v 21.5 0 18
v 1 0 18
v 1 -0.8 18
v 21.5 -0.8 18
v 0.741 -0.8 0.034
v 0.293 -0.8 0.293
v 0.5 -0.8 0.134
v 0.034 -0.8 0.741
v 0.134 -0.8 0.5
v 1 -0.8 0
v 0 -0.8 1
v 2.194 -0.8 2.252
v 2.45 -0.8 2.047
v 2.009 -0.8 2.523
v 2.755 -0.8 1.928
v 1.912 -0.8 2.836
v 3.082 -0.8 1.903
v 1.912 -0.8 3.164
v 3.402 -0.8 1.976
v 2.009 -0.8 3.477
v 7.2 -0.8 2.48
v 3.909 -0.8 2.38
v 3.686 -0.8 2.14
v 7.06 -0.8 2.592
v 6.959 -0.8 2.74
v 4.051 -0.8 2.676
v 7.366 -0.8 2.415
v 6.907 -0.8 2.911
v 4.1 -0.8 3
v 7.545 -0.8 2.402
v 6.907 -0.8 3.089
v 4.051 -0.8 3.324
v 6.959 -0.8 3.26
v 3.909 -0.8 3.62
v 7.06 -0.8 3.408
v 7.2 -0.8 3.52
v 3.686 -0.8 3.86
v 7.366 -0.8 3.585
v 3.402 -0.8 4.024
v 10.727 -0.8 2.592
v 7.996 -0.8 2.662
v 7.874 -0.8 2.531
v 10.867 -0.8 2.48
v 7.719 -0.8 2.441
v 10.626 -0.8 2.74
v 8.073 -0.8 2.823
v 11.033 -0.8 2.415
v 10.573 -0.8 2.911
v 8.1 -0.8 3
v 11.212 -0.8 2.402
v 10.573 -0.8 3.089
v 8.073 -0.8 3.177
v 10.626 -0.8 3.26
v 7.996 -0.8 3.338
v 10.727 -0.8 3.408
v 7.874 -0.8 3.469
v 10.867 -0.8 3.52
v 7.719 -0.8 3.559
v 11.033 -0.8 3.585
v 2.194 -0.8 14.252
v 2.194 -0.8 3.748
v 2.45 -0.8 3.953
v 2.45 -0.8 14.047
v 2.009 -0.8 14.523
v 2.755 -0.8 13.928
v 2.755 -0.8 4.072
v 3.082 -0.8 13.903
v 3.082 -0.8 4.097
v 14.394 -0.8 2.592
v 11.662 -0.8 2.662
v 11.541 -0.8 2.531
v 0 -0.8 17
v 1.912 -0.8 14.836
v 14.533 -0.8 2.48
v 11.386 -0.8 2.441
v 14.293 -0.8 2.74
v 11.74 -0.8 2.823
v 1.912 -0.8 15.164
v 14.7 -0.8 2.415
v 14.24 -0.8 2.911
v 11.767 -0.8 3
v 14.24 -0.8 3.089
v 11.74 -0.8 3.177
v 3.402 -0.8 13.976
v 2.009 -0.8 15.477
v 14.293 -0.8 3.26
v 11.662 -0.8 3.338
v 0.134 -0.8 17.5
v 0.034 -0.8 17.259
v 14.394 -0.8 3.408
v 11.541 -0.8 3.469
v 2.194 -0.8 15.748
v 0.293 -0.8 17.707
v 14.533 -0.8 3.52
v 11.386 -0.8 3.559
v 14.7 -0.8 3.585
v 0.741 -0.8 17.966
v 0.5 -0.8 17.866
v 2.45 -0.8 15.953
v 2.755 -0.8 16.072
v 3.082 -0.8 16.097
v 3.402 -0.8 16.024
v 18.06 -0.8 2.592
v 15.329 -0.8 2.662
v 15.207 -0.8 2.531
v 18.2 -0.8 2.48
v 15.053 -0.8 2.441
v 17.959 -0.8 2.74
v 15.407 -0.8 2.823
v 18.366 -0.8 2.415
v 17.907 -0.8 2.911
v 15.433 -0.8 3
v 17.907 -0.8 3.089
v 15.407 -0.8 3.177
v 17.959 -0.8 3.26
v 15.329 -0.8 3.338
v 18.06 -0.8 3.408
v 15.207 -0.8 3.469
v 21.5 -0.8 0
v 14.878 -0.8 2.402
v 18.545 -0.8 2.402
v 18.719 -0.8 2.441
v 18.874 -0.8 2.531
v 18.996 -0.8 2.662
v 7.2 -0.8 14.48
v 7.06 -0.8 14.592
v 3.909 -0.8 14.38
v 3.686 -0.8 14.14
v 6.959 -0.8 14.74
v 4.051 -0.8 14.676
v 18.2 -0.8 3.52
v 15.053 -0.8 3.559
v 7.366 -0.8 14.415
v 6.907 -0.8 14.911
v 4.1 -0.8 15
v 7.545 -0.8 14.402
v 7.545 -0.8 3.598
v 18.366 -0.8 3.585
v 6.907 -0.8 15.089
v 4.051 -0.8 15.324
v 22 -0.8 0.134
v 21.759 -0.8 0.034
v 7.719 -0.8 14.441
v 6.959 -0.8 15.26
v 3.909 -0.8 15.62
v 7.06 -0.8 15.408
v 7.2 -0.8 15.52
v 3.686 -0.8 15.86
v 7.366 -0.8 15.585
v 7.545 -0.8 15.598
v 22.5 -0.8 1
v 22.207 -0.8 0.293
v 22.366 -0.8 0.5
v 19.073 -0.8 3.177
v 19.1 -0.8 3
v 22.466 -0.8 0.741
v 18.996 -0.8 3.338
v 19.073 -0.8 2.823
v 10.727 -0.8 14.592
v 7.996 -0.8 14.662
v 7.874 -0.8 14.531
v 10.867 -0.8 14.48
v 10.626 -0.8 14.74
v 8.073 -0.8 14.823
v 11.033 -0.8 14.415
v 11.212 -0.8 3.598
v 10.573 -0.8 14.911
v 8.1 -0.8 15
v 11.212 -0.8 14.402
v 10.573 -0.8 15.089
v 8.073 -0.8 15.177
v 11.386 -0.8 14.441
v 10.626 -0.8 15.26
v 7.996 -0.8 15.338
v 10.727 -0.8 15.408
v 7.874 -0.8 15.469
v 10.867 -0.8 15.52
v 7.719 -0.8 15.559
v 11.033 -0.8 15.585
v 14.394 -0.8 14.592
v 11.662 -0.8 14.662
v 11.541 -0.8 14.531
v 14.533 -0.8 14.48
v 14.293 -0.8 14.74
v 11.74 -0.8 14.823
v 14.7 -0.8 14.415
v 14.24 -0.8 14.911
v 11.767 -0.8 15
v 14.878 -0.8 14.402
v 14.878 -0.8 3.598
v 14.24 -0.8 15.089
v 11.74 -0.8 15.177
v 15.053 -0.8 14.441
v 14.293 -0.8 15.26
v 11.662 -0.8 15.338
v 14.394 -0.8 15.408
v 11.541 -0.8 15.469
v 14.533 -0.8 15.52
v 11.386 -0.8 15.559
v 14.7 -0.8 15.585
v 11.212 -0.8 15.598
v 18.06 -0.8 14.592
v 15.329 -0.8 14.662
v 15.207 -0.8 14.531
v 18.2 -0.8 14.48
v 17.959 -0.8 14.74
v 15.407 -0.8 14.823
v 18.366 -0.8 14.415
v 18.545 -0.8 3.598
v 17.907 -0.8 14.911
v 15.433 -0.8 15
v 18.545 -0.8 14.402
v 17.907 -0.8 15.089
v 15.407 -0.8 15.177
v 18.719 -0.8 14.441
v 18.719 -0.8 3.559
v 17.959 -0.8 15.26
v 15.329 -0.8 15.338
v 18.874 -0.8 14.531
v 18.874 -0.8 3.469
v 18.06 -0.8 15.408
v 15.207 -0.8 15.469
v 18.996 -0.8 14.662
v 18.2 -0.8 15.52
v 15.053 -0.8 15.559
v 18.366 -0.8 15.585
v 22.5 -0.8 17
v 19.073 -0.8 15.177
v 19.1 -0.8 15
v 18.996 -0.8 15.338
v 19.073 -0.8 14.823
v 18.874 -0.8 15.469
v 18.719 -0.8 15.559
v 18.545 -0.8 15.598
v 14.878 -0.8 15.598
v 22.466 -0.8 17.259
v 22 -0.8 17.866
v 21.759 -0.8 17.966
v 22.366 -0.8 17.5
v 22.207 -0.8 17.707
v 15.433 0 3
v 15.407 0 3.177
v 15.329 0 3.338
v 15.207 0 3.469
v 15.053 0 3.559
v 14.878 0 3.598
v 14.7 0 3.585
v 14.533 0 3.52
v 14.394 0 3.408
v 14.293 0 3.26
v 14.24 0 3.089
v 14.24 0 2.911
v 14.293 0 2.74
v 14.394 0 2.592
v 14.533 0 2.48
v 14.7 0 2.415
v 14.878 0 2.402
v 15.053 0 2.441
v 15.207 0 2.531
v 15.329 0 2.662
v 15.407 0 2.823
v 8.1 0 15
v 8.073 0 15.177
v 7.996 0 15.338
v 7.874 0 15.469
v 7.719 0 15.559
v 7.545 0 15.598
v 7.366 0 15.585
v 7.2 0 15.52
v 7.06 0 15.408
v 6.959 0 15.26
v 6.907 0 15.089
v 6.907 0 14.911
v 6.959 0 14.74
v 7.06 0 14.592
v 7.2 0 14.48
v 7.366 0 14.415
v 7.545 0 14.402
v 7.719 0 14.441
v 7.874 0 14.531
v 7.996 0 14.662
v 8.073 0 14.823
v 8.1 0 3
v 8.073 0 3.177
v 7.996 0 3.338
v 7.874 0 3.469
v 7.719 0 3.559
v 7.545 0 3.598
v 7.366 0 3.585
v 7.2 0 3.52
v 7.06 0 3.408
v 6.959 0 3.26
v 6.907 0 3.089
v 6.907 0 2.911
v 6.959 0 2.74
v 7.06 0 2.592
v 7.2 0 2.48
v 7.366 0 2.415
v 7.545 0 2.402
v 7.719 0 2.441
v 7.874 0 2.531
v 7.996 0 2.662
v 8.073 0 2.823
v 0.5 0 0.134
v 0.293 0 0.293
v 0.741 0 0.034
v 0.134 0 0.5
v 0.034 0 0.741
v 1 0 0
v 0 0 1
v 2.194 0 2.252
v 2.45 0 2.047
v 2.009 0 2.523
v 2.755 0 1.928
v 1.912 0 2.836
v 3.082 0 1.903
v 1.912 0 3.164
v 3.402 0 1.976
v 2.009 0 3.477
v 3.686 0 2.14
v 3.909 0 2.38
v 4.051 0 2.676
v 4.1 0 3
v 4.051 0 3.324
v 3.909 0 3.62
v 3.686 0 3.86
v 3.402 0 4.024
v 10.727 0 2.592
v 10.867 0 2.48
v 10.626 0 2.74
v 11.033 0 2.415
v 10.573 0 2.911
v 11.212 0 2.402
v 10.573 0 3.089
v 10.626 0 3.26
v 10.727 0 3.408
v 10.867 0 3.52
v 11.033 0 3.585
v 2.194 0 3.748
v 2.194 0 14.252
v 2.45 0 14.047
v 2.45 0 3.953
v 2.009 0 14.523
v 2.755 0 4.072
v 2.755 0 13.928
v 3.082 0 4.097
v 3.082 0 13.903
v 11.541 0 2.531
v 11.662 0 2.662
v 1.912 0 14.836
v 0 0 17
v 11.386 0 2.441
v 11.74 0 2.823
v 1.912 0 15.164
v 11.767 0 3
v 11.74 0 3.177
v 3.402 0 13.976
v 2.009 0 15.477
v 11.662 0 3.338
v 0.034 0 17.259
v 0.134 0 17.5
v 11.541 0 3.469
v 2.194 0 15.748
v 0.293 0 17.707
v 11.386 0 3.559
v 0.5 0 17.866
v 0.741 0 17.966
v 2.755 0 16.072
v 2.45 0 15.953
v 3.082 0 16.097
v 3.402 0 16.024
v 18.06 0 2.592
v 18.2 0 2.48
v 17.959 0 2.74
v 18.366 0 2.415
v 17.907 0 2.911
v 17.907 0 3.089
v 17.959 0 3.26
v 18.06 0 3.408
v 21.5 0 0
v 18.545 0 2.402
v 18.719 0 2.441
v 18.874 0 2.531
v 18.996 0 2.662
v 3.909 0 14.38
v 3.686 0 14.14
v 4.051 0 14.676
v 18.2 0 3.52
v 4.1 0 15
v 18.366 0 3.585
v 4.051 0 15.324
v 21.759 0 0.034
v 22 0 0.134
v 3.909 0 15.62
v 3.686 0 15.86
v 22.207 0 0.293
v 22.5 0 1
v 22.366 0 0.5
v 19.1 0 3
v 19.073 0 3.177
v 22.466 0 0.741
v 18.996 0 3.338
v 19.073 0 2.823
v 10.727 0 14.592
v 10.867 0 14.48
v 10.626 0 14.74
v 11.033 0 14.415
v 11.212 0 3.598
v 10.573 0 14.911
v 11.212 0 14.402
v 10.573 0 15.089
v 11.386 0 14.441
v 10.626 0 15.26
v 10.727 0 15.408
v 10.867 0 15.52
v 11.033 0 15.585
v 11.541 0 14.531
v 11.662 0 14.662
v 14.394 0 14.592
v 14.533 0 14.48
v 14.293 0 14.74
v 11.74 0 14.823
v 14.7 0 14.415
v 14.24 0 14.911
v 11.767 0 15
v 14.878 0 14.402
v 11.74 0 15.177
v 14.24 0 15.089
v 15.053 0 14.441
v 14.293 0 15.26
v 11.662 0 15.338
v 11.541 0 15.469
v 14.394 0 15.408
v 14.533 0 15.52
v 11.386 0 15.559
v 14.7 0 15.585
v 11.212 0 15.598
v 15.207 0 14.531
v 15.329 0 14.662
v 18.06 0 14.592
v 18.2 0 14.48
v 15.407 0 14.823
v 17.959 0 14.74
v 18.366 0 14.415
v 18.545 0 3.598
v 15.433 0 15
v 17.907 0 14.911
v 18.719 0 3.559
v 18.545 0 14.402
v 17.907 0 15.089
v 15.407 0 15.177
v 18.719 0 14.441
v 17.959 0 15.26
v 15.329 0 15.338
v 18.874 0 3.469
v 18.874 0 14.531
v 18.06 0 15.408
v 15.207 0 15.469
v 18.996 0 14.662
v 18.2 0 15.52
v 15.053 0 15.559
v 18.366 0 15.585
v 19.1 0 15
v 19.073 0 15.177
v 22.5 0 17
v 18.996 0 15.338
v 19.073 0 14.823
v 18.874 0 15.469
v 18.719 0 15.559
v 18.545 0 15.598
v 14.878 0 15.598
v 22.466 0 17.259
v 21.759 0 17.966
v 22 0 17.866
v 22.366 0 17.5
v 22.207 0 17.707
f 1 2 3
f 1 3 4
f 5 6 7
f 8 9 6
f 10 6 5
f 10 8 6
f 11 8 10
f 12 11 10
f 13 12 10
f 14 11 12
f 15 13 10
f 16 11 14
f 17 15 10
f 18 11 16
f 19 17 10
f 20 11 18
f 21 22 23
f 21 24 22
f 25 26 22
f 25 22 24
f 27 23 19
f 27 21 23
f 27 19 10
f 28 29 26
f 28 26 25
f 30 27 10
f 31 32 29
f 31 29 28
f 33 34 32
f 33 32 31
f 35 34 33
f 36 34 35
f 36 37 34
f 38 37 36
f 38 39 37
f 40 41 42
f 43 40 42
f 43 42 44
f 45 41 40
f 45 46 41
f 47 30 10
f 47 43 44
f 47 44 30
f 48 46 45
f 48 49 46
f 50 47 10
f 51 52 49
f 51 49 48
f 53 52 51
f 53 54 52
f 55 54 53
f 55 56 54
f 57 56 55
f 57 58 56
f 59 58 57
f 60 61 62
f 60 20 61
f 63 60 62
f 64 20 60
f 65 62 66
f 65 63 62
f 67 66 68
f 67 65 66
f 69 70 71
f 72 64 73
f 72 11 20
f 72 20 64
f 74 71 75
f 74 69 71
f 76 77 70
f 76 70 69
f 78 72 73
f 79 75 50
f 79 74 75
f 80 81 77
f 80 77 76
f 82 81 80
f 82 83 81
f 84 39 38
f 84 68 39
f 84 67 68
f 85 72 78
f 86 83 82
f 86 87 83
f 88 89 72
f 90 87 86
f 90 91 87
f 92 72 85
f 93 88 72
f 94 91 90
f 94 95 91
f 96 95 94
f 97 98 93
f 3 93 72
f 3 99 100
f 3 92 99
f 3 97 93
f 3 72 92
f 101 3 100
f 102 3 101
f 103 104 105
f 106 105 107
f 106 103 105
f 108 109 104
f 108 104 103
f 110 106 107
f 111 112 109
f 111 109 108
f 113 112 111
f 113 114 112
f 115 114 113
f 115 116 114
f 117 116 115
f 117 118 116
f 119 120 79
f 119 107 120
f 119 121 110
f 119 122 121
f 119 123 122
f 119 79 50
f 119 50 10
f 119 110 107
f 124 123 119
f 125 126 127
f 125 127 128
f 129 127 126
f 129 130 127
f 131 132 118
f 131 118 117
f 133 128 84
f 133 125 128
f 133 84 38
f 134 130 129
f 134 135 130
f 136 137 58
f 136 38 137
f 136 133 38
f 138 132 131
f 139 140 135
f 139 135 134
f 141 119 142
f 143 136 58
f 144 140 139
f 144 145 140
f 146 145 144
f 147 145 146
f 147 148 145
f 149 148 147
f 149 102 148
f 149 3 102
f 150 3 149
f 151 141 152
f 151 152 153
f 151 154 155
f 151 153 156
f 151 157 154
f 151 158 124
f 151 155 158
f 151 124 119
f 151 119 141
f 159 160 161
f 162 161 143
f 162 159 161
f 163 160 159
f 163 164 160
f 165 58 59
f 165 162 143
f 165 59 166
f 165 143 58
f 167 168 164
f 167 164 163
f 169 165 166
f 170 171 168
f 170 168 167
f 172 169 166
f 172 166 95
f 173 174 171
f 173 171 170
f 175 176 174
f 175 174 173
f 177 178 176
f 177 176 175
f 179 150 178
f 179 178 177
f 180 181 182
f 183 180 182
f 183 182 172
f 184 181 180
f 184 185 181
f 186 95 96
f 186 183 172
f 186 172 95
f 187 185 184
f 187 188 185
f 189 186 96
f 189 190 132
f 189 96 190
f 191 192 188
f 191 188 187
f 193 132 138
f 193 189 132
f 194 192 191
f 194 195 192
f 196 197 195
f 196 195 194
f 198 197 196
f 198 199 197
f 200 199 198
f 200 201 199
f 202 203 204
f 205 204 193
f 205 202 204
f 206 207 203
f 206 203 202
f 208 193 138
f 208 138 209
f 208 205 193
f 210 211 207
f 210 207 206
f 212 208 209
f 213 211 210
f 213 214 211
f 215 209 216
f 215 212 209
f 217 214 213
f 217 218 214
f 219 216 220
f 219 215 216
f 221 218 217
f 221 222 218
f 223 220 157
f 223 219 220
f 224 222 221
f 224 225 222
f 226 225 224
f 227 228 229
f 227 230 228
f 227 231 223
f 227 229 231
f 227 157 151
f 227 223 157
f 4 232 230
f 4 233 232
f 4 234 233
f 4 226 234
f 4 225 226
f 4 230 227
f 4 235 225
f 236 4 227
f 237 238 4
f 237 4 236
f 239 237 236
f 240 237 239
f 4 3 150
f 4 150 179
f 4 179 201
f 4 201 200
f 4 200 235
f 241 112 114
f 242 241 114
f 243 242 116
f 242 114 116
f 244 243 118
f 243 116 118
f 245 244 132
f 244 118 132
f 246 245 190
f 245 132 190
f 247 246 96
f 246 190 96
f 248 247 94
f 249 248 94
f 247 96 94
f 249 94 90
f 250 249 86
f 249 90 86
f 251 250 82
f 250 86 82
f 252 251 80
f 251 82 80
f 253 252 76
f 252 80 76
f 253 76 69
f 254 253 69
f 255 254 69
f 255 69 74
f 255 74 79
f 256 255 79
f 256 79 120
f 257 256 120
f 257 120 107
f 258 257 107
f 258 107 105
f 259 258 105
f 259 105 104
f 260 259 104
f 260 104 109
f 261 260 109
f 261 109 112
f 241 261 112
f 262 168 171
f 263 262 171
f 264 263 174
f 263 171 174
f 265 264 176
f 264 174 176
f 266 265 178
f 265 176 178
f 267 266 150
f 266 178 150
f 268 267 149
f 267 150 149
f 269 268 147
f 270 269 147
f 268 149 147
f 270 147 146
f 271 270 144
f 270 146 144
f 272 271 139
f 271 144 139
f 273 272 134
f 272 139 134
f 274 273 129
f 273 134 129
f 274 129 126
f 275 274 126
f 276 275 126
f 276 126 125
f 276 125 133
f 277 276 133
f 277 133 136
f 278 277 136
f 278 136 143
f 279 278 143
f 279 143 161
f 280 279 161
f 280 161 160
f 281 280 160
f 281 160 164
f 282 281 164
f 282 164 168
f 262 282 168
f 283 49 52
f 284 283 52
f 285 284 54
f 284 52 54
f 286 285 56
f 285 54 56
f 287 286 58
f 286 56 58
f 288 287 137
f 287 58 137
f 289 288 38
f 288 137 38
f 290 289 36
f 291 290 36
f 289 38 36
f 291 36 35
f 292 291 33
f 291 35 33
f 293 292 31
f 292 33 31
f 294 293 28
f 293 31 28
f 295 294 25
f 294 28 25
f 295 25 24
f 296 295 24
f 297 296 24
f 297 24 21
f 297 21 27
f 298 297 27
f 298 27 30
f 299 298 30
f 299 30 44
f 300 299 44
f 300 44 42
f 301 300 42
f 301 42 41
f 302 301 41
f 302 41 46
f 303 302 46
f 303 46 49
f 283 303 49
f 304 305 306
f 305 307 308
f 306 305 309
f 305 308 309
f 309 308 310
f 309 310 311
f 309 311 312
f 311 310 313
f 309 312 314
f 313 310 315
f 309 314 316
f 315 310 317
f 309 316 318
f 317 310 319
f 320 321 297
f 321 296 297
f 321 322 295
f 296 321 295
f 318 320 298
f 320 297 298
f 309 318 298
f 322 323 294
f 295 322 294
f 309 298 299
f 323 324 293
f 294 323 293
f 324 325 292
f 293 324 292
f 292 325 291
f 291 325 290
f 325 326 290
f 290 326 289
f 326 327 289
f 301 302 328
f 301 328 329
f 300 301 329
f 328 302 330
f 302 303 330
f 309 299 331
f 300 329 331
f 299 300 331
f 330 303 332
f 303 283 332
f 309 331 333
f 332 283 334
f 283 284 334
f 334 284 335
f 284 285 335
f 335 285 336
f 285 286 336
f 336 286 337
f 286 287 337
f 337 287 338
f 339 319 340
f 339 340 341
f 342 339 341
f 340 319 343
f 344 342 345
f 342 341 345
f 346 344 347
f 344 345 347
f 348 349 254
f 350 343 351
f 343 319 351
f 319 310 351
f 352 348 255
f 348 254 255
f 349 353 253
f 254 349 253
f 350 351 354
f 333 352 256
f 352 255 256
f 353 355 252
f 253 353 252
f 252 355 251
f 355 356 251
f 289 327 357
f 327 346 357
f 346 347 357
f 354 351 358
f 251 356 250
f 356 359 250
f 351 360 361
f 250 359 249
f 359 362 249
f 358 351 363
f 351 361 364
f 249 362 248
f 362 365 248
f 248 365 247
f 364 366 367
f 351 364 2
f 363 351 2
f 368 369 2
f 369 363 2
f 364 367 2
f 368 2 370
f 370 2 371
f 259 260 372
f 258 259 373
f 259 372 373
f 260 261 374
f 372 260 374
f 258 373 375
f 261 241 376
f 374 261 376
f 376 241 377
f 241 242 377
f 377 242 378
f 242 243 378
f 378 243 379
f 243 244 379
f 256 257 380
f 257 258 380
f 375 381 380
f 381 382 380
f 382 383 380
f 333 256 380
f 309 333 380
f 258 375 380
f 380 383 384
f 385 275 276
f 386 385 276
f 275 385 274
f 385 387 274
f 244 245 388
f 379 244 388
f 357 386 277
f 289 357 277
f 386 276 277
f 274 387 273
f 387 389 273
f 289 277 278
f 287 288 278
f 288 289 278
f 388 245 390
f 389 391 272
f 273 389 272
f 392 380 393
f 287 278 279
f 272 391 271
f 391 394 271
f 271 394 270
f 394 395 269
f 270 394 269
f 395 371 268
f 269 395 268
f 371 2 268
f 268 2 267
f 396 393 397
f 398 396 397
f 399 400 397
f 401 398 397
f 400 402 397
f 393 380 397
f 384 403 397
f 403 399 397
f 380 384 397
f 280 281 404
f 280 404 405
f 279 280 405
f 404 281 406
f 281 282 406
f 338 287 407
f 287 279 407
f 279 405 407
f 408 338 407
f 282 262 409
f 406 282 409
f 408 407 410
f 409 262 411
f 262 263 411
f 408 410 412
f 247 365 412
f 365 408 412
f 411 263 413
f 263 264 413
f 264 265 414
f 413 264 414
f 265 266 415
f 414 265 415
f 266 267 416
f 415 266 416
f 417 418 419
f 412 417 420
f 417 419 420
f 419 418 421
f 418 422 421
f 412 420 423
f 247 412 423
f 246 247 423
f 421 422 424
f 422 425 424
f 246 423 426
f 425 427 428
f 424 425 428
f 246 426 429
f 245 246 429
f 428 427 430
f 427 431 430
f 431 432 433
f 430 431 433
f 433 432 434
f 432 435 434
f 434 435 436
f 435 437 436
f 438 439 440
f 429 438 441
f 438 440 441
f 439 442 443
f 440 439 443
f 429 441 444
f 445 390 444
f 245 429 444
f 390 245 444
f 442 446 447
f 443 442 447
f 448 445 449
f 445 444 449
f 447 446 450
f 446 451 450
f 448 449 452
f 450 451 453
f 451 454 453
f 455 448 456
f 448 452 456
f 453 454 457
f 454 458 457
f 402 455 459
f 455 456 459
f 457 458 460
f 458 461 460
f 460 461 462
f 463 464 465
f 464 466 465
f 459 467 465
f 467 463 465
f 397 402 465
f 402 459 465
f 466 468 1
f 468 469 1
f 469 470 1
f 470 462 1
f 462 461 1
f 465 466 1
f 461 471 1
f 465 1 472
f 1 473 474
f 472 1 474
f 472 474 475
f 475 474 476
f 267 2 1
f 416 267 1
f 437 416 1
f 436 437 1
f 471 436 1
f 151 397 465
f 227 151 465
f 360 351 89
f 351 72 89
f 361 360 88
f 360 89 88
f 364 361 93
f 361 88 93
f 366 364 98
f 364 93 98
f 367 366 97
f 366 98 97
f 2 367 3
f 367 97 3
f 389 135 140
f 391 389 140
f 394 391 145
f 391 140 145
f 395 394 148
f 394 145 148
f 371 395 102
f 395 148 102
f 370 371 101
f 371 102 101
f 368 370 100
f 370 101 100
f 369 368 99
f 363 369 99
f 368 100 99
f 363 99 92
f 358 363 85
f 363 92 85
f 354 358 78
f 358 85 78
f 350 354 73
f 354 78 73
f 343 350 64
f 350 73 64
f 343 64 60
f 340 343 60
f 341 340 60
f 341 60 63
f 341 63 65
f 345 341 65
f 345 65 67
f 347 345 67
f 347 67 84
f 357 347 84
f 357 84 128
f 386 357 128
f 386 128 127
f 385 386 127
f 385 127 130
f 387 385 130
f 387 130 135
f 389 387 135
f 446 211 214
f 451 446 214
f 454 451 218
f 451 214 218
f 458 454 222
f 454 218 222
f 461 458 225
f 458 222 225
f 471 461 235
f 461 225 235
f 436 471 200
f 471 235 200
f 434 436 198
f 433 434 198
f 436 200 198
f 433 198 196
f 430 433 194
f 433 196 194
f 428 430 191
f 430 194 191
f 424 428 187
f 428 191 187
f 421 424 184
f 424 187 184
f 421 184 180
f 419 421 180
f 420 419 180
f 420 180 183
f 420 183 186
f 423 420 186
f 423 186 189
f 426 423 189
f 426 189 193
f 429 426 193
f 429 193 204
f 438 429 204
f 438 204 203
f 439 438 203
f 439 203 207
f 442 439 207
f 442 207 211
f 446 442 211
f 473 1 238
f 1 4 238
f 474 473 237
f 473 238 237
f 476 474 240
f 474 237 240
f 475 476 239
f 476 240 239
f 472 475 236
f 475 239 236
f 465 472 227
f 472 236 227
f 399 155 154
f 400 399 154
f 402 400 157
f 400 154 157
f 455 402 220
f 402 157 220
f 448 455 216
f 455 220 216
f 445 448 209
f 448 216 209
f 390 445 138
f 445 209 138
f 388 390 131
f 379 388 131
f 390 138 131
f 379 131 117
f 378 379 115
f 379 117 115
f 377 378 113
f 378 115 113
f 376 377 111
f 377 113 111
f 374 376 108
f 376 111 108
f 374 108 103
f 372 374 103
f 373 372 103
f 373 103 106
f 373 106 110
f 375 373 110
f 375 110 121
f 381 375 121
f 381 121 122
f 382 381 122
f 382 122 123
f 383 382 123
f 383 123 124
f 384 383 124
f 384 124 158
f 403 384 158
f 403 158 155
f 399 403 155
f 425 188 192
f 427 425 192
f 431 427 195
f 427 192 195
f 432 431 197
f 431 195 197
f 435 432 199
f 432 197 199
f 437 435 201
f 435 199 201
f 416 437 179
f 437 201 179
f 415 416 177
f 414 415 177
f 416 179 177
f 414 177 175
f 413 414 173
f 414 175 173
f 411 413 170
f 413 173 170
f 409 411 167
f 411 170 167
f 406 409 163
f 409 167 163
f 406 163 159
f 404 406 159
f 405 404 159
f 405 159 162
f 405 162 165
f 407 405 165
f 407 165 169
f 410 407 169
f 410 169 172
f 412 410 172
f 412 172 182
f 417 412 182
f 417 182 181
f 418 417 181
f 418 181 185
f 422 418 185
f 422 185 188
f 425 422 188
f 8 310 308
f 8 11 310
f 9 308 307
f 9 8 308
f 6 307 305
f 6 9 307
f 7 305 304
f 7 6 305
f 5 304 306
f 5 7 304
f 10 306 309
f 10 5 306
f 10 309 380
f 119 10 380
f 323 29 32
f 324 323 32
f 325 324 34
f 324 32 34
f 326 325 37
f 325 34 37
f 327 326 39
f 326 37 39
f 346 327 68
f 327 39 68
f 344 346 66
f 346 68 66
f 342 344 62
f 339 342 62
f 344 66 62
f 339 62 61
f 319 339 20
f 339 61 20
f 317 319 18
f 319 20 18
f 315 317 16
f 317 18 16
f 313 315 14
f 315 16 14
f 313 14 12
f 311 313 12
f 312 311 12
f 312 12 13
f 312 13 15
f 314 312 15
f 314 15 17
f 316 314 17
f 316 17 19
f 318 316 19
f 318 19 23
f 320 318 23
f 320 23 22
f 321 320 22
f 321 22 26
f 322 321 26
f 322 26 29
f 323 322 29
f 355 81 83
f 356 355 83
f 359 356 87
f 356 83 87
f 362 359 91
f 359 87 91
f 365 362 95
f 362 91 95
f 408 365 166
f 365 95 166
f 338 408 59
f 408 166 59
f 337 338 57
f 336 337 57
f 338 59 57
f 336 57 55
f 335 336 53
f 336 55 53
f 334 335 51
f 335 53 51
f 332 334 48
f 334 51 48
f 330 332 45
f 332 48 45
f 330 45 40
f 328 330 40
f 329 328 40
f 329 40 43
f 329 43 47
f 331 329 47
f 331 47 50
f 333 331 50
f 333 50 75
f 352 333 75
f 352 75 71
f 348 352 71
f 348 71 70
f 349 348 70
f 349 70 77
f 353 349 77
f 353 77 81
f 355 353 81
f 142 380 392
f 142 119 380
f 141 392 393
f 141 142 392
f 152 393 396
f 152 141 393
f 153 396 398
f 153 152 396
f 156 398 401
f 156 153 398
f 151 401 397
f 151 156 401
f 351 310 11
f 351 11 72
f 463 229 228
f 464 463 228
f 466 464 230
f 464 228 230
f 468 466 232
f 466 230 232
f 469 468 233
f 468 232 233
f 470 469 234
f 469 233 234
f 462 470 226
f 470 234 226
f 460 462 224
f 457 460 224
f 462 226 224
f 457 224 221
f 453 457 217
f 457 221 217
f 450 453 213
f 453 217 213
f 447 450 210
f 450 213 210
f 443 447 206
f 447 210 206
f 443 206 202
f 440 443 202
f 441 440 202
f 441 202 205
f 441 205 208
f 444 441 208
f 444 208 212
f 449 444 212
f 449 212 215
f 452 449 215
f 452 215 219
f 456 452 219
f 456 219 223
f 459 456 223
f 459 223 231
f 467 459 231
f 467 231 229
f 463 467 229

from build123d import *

# Parameters (mm, degrees)
SKETCH_W            = 22.5
SKETCH_H            = 18
PAD_DEPTH           = 0.8
SKETCH001_R         = 1.1
POCKET_DEPTH        = 5
FILLET_R            = 1
SKETCH002_R         = 0.6
POCKET001_DEPTH     = 5
LINEARPATTERN_COUNT = 4
LINEARPATTERN_PITCH = 3.666667


with BuildPart() as part:
    # Sketch → Pad (new body)
    with BuildSketch(Plane.XZ):
        with Locations((11.25, 9)):
            Rectangle(SKETCH_W, SKETCH_H)
    extrude(amount=PAD_DEPTH)

    # Sketch001 (on Face6 of Pad) → Pocket (cut)
    with BuildSketch(Plane.XZ.offset(0.8)):
        with Locations((3, 15)):
            Circle(SKETCH001_R)
        with Locations((3, 3)):
            Circle(SKETCH001_R)
    extrude(amount=-POCKET_DEPTH, mode=Mode.SUBTRACT)

    # Fillet
    fillet_edges = [part.edges().sort_by_distance(p)[0] for p in [
        (0, -0.4, 18),
        (22.5, -0.4, 18),
        (22.5, -0.4, 0),
        (0, -0.4, 0),
    ]]
    fillet(fillet_edges, radius=FILLET_R)

    # Sketch002 (on Face5 of Fillet) → Pocket001 (cut)
    with BuildSketch(Plane.XZ.offset(0.8)):
        with Locations((7.5, 15)):
            Circle(SKETCH002_R)
        with Locations((7.5, 3)):
            Circle(SKETCH002_R)
    pocket001 = extrude(amount=-POCKET001_DEPTH, mode=Mode.SUBTRACT)

    # LinearPattern: Pocket001 ×4
    with Locations(*[(i * LINEARPATTERN_PITCH, 0, 0) for i in range(1, LINEARPATTERN_COUNT)]):
        add(pocket001, mode=Mode.SUBTRACT)


solid = part.part
